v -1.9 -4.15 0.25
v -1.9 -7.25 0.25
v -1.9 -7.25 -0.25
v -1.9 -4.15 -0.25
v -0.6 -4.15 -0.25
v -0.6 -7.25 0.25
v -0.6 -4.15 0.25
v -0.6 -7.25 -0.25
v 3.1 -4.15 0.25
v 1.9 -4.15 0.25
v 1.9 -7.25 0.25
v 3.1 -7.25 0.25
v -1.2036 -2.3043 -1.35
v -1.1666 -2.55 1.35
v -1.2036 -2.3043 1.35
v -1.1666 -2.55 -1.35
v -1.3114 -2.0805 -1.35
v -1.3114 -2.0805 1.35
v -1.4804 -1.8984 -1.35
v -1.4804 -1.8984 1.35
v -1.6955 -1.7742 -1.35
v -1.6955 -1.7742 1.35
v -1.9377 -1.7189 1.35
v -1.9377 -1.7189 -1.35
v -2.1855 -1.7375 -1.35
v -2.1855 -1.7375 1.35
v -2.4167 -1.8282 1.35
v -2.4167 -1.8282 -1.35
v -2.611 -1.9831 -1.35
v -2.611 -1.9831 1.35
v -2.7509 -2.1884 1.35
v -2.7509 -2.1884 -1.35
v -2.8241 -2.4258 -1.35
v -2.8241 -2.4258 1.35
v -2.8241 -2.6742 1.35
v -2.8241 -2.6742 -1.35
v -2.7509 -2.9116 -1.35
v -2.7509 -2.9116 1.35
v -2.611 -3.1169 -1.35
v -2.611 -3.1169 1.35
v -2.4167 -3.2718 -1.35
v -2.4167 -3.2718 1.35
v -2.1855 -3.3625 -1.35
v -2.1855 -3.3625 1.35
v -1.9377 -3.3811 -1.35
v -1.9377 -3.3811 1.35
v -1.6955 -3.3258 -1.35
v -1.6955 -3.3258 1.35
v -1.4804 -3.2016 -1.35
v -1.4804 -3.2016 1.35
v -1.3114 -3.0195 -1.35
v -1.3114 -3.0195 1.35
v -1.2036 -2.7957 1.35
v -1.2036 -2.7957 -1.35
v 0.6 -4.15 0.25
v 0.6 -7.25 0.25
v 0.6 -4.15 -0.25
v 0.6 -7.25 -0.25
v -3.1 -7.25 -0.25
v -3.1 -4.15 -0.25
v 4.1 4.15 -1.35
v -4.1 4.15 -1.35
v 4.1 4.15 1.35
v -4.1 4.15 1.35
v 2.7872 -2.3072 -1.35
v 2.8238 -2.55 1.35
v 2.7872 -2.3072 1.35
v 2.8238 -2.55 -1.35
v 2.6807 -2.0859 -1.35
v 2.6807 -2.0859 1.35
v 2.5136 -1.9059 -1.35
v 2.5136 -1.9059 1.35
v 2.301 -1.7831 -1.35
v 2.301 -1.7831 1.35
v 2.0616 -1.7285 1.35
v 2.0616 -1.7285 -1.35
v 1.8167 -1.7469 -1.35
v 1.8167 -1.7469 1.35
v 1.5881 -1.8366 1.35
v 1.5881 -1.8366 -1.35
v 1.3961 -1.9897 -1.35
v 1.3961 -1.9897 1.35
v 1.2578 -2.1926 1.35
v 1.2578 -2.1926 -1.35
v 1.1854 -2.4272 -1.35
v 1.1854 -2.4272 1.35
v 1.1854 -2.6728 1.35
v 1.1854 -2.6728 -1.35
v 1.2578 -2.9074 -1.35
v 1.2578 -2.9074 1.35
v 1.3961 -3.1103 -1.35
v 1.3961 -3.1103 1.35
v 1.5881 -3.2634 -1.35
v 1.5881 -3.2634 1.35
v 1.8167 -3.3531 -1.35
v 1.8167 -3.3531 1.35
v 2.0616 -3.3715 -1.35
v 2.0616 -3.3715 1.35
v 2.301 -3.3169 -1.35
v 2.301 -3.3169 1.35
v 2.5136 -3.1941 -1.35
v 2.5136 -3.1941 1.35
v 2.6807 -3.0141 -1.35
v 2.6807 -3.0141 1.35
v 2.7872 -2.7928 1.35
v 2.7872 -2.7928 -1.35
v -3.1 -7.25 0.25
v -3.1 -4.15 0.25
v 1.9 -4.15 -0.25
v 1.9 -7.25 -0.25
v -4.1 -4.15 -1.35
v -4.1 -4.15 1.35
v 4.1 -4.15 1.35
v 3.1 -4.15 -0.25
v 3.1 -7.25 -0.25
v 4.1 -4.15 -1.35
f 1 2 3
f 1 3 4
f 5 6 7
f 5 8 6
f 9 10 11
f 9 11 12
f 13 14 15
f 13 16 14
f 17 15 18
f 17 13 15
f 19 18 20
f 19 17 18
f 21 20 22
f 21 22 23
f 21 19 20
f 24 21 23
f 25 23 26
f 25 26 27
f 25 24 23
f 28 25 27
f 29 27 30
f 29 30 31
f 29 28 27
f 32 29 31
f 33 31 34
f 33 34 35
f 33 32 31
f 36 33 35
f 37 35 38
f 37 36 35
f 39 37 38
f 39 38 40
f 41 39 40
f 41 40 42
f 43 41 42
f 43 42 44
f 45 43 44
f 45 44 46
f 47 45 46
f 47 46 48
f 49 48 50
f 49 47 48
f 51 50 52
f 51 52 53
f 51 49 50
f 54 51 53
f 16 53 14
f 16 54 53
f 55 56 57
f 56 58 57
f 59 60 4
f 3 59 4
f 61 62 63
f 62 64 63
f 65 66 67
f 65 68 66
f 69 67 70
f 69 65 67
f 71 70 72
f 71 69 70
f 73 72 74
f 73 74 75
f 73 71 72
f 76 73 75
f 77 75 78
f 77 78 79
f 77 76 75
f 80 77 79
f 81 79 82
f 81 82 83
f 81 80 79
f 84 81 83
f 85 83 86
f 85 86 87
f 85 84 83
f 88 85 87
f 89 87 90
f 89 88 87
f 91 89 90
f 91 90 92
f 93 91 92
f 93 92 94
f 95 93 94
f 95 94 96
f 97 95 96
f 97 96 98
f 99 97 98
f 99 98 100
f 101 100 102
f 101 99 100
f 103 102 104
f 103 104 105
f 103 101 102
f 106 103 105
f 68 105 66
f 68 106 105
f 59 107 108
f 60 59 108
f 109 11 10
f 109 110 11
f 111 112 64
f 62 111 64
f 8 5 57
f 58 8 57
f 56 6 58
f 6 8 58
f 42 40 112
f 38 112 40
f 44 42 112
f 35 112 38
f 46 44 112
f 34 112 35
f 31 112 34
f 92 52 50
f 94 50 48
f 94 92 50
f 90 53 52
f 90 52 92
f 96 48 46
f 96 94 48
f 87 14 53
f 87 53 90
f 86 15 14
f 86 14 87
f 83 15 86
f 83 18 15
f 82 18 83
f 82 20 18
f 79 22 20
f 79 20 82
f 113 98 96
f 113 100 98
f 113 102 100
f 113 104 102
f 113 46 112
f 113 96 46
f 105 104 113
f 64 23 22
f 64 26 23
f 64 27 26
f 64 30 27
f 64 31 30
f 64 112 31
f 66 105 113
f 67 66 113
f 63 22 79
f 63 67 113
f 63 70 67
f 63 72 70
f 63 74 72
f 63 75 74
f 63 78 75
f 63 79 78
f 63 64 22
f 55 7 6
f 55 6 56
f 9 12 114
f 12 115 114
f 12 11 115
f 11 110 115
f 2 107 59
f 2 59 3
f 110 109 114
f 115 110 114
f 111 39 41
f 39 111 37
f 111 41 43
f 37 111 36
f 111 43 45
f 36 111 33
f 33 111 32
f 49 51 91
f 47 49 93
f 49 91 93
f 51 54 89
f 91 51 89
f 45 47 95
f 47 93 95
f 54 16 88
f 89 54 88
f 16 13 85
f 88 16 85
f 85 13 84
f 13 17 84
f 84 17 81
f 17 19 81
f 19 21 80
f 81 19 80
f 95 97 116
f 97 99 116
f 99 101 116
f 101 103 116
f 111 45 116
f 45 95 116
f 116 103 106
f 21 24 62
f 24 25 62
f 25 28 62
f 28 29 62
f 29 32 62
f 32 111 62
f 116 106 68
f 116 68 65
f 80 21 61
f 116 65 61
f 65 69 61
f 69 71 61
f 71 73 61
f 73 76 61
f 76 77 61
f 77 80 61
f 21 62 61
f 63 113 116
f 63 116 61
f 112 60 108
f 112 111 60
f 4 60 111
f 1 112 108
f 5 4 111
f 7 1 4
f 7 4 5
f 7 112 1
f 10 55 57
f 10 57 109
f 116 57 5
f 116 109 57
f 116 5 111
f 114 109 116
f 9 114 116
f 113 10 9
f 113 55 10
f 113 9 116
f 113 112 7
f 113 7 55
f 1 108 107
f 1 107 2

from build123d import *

# Parameters (mm, degrees)
SKETCH2_W           = 8.2
SKETCH2_H           = 8.3
SKETCH2_R           = 0.833443519
SKETCH2_R_2         = 0.823803164
BOSS_EXTRUDE1_DEPTH = 1.35
SKETCH3_W           = 1.2
SKETCH3_H           = 3.1
BOSS_EXTRUDE2_DEPTH = 0.25


with BuildPart() as part:
    # Sketch2 → Boss-Extrude1 (new body, symmetric)
    with BuildSketch(Plane.XY):
        Rectangle(SKETCH2_W, SKETCH2_H)
        with Locations((-2, -2.55)):
            Circle(SKETCH2_R, mode=Mode.SUBTRACT)
        with Locations((2, -2.55)):
            Circle(SKETCH2_R_2, mode=Mode.SUBTRACT)
    extrude(amount=BOSS_EXTRUDE1_DEPTH, both=True)

    # Sketch3 → Boss-Extrude2 (add, symmetric)
    with BuildSketch(Plane.XY):
        with Locations((0, -5.7)):
            Rectangle(SKETCH3_W, SKETCH3_H)
        with Locations((2.5, -5.7)):
            Rectangle(SKETCH3_W, SKETCH3_H)
        with Locations((-2.5, -5.7)):
            Rectangle(SKETCH3_W, SKETCH3_H)
    extrude(amount=BOSS_EXTRUDE2_DEPTH, both=True)


solid = part.part
